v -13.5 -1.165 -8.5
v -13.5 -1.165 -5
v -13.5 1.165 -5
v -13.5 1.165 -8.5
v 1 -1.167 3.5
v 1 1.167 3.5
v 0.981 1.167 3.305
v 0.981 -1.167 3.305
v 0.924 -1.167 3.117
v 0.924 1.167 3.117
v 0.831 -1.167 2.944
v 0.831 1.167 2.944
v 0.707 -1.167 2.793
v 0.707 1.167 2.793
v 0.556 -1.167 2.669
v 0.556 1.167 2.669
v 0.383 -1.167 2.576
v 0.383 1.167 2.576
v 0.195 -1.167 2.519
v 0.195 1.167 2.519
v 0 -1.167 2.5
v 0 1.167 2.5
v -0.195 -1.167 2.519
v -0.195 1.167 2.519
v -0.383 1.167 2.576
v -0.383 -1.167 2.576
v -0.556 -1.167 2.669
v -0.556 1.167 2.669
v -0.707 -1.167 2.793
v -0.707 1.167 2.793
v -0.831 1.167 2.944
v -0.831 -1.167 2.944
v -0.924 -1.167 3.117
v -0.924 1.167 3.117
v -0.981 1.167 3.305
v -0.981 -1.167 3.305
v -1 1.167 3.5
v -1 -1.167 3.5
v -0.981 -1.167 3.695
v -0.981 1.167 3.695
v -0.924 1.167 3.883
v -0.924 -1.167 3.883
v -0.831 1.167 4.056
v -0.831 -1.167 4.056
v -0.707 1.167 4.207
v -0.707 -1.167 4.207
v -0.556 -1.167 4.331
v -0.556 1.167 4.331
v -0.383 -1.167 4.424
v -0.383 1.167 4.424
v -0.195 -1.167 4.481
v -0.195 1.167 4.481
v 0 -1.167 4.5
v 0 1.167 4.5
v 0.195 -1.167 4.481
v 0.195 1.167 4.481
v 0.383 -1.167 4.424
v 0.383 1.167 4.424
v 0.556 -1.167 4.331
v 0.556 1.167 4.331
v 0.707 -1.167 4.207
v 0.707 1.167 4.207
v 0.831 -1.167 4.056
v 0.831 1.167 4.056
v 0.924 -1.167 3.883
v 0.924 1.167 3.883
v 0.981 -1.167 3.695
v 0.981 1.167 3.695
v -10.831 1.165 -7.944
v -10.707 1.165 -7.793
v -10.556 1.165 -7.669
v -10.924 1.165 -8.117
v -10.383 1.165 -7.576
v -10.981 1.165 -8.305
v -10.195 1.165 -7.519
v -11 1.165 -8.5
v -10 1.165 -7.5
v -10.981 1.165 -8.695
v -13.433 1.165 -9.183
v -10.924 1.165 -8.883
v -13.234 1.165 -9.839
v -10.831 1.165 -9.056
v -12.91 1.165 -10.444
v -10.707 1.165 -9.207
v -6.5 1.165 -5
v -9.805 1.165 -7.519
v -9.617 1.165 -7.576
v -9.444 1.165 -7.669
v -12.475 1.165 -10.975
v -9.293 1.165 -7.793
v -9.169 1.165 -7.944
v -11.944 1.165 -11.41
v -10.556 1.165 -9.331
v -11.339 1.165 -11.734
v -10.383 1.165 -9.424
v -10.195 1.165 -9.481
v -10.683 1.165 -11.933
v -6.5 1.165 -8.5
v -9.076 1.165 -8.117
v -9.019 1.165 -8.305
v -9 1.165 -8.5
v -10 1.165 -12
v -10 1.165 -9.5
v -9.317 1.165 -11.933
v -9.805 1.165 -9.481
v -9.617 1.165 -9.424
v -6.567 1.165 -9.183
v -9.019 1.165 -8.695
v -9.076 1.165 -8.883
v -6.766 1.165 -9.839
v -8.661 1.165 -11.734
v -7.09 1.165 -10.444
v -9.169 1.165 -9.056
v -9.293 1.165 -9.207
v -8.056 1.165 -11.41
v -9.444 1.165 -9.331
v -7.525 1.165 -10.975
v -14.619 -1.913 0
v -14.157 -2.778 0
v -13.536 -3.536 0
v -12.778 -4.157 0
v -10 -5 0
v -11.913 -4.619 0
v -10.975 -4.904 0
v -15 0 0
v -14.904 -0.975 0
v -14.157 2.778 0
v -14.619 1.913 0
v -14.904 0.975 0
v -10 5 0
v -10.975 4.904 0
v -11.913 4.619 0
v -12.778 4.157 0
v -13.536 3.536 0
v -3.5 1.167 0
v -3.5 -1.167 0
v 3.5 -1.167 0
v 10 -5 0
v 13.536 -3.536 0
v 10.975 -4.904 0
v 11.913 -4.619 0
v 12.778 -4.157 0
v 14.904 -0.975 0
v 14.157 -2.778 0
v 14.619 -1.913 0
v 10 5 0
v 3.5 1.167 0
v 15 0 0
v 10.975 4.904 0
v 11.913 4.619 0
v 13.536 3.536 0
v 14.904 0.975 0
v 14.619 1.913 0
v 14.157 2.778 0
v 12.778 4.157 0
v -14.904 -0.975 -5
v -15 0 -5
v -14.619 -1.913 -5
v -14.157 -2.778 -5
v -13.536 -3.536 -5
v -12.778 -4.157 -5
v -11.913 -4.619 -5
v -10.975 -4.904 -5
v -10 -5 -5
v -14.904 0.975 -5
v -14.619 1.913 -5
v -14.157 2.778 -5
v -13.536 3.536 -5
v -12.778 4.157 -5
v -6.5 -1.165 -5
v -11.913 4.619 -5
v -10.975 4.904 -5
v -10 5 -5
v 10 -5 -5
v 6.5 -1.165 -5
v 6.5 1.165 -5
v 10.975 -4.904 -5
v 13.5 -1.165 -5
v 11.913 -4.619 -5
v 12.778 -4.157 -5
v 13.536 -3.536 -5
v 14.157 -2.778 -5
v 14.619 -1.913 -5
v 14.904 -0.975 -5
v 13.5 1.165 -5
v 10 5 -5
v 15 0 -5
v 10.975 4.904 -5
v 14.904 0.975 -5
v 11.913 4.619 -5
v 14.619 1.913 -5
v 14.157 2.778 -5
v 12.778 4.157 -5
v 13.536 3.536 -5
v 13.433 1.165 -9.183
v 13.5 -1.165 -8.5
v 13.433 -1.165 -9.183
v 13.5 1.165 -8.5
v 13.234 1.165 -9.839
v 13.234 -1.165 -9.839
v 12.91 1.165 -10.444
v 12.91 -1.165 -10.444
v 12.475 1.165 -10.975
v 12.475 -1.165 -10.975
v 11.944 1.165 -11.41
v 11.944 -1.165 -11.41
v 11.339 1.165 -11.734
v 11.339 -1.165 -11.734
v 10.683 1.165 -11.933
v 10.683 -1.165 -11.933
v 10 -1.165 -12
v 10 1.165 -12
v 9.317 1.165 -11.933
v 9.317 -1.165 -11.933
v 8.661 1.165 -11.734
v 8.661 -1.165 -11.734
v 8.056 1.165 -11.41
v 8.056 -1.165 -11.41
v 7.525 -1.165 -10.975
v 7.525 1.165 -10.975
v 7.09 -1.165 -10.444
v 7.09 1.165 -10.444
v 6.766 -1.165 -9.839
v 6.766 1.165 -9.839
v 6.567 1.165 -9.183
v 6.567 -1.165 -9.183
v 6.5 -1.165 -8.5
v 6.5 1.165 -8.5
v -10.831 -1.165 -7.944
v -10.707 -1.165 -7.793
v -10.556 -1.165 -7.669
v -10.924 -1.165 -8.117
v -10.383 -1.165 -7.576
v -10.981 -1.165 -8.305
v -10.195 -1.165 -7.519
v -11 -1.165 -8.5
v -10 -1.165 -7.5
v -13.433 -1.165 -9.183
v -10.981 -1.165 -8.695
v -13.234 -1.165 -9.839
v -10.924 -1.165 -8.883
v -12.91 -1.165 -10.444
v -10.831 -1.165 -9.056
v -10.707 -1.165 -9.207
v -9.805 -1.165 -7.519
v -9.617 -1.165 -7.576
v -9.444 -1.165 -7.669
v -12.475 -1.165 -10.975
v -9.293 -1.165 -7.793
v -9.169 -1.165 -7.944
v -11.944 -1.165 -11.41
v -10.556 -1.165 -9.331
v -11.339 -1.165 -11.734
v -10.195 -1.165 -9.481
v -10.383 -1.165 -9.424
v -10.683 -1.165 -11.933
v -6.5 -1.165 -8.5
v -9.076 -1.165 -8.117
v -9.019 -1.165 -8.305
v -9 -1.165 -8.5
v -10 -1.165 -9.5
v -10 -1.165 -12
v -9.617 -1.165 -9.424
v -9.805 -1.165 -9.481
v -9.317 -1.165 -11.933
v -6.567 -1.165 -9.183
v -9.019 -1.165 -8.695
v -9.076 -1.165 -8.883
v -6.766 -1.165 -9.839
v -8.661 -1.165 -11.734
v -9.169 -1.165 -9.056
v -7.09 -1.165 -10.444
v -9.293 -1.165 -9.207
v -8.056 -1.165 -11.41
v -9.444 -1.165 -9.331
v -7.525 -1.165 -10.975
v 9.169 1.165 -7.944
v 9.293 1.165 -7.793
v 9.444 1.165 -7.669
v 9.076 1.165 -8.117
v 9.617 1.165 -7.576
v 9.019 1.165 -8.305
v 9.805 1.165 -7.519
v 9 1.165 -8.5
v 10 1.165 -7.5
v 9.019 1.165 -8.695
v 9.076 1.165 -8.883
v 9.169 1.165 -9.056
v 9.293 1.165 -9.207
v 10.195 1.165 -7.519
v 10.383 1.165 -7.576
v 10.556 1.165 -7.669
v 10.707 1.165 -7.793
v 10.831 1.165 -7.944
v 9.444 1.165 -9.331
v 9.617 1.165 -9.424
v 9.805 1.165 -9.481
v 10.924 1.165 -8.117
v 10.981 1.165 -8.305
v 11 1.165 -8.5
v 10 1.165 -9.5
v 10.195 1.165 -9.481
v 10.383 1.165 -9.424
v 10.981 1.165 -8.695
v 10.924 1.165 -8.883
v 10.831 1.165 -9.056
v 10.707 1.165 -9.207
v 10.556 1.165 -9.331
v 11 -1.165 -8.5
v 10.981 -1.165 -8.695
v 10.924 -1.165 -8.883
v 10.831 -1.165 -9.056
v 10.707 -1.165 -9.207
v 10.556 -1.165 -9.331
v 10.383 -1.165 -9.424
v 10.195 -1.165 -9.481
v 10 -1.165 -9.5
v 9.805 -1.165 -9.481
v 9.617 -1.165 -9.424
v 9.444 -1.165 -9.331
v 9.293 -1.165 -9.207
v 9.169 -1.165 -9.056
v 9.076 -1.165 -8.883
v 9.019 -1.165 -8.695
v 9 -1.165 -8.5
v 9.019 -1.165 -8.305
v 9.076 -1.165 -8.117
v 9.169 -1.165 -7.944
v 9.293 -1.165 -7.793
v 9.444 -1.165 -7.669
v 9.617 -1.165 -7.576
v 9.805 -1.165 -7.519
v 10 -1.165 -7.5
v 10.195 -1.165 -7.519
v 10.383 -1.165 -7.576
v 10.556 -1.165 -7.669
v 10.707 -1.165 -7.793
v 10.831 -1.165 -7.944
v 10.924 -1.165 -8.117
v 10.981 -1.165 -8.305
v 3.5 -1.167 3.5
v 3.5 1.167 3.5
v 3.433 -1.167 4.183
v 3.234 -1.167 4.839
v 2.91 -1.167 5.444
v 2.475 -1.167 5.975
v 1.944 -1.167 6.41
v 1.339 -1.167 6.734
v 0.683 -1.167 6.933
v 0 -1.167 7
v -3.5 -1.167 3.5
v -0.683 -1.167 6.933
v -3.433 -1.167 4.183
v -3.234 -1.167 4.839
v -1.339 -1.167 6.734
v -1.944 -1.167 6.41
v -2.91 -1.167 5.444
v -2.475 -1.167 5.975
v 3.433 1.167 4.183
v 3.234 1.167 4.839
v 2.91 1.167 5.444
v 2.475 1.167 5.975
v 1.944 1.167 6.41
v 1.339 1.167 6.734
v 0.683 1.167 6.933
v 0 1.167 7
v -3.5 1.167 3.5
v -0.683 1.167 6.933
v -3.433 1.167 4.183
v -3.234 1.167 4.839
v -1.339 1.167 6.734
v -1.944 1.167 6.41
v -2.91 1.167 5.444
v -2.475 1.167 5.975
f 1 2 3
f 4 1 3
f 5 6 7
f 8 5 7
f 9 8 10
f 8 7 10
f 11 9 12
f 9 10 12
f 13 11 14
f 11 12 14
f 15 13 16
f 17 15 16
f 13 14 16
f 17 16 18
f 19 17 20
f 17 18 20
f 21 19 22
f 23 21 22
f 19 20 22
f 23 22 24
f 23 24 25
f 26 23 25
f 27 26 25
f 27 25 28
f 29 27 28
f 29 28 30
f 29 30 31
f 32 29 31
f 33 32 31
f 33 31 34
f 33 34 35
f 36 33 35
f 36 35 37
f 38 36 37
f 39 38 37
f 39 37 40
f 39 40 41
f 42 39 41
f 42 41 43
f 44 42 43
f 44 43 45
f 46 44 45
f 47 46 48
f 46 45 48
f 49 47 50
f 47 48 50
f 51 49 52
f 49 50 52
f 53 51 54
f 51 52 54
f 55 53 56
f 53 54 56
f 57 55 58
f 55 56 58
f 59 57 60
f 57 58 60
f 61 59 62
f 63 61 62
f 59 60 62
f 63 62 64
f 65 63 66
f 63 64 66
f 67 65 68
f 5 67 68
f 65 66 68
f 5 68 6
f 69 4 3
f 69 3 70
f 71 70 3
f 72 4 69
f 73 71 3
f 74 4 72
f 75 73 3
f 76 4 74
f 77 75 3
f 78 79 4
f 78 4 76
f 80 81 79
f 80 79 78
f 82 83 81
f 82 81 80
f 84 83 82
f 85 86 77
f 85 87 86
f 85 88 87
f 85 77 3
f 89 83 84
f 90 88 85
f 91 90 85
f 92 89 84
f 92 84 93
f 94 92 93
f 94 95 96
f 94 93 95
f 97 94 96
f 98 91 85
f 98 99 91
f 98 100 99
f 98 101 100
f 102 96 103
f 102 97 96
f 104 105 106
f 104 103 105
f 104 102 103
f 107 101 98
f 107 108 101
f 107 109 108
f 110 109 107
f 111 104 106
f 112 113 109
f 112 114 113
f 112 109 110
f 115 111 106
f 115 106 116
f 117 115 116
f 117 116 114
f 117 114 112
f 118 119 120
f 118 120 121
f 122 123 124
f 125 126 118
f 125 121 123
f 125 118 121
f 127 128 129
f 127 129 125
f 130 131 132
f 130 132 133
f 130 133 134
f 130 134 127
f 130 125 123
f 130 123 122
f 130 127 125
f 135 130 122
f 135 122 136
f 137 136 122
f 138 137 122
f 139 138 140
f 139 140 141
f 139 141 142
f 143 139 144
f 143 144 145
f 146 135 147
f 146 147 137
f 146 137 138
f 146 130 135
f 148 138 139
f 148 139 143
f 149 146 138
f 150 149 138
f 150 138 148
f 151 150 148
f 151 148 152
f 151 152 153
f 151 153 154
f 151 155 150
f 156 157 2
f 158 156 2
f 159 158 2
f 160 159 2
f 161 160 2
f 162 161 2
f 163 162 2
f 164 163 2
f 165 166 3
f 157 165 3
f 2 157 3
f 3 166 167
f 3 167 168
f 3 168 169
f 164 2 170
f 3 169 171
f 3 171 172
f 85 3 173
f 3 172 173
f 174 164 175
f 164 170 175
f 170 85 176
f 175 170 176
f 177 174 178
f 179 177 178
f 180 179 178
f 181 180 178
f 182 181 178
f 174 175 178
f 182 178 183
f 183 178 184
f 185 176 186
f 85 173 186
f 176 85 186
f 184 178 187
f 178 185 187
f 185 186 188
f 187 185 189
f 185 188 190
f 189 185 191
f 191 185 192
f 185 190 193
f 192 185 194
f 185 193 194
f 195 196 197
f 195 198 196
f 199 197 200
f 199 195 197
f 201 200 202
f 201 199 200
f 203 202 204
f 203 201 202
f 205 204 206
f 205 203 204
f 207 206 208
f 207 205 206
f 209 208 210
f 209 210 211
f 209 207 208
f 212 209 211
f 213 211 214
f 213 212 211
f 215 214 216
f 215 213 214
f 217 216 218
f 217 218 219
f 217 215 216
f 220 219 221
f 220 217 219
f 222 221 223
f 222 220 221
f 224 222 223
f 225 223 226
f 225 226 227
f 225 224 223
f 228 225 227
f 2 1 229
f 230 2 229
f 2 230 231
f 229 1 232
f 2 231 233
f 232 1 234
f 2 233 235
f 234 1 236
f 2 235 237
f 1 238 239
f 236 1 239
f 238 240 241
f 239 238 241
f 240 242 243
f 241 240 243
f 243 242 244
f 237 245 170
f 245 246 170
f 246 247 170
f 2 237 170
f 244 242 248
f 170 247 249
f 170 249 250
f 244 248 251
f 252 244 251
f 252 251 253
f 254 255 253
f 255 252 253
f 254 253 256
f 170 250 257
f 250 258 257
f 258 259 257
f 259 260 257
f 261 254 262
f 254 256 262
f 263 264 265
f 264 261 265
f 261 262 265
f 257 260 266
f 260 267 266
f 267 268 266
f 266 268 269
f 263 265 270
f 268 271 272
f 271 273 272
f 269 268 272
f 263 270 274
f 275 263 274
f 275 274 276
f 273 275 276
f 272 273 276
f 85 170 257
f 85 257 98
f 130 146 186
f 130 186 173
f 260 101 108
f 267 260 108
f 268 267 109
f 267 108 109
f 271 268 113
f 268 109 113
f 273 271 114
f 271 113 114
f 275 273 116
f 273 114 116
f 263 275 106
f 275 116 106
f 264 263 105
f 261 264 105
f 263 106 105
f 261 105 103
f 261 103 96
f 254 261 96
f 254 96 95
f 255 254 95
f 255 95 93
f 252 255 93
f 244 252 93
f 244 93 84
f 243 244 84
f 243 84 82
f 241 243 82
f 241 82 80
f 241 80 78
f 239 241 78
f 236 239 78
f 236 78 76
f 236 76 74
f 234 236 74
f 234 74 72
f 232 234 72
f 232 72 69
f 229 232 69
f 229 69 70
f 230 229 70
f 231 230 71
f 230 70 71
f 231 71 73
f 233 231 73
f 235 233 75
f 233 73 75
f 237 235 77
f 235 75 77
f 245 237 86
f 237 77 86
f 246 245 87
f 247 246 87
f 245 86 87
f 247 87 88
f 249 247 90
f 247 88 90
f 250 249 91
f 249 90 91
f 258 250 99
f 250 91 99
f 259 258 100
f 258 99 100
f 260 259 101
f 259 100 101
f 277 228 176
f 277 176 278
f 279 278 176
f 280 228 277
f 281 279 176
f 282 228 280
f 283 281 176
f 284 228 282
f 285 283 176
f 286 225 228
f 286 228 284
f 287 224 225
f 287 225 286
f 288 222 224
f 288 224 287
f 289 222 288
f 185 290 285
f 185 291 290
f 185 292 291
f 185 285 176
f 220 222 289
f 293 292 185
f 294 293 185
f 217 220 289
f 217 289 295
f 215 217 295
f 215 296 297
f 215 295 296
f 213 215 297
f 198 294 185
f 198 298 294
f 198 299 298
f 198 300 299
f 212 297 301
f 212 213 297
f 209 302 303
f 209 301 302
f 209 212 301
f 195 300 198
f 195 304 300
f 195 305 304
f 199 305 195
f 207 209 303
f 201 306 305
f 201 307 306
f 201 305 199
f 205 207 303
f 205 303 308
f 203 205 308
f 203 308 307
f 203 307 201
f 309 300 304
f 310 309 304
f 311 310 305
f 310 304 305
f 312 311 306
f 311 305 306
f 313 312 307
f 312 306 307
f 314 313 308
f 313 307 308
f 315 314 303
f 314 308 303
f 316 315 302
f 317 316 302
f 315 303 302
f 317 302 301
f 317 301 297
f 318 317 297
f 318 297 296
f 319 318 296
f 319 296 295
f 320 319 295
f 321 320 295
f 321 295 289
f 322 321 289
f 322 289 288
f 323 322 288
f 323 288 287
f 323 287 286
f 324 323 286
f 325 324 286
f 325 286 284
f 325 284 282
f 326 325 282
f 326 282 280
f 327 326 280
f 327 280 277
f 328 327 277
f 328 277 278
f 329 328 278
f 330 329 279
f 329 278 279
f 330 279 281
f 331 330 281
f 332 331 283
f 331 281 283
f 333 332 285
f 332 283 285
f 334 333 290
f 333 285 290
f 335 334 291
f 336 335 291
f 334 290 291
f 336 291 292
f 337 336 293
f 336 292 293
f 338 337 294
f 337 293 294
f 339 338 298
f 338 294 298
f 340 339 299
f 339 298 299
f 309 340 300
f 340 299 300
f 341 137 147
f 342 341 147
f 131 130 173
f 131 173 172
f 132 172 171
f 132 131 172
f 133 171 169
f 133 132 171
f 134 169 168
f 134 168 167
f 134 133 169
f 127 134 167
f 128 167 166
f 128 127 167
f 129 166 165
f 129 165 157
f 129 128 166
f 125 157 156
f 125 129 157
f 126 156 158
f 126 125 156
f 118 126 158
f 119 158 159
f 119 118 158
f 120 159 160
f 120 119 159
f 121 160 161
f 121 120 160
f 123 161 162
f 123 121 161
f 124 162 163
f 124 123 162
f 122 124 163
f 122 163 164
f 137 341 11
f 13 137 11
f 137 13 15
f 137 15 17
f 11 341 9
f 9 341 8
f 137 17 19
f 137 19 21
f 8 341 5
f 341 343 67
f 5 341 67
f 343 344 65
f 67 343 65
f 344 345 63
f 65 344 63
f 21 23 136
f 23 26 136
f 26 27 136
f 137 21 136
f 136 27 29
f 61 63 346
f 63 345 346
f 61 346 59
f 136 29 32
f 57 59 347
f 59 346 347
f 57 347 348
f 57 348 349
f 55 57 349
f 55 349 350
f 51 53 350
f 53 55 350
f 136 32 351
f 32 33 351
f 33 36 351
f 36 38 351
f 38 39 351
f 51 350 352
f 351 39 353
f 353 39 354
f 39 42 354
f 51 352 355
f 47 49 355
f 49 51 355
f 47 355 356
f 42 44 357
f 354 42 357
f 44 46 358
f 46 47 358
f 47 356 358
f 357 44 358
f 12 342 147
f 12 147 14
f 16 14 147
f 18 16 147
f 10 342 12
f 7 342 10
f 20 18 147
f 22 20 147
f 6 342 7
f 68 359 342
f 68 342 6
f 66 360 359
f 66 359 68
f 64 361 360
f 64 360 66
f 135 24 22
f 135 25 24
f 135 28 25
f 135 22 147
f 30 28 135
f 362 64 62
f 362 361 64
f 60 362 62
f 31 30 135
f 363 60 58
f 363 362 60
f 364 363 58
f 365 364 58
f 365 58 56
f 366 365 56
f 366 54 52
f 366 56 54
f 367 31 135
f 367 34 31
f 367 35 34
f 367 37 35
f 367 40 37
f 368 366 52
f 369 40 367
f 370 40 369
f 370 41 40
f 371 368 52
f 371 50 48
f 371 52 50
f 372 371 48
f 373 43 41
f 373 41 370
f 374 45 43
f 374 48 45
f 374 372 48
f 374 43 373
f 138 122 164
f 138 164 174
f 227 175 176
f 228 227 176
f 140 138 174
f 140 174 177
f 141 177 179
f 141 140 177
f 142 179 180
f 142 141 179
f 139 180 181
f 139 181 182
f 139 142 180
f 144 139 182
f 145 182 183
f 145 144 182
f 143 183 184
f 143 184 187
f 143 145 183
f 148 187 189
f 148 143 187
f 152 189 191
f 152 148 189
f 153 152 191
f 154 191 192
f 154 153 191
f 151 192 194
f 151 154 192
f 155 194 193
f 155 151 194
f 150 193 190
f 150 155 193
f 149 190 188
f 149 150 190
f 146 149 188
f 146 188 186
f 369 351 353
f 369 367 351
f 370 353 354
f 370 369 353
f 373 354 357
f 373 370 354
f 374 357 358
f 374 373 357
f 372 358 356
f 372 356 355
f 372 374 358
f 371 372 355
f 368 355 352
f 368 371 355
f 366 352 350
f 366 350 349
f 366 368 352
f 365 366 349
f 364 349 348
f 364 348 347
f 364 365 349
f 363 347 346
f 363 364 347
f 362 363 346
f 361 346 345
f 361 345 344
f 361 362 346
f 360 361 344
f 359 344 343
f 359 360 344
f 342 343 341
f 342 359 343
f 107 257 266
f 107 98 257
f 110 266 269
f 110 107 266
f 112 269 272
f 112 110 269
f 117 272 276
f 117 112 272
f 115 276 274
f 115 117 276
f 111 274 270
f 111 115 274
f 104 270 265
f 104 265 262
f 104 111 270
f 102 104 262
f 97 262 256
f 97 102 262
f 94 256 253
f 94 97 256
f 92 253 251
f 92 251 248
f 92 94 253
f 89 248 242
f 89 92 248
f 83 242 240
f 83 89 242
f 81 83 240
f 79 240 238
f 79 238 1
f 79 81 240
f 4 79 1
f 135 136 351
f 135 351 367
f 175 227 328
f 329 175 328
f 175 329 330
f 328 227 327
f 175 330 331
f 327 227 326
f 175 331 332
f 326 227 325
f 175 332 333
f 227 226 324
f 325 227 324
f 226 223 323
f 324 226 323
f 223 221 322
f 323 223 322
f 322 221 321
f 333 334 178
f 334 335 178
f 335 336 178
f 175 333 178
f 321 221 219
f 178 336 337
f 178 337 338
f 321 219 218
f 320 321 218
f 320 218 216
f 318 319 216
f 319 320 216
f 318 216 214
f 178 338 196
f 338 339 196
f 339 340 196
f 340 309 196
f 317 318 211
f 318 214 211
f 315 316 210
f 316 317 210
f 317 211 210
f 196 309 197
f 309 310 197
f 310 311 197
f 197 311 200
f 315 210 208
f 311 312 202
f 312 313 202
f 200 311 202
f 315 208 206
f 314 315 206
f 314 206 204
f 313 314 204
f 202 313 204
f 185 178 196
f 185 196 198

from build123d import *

# Parameters (mm, degrees)
BOSS_EXTRUDE1_DEPTH = 5
SKETCH3_W           = 7
SKETCH3_H           = 2.333333334
BOSS_EXTRUDE2_DEPTH = 3.5
SKETCH6_W           = 3.5
SKETCH6_H           = 2.333333334
REVOLVE1_ANGLE      = 180
CUT_EXTRUDE1_REACH  = 19.664
SKETCH7_R           = 1
SKETCH8_W           = 7
SKETCH8_H           = 2.33
BOSS_EXTRUDE3_DEPTH = 3.5
SKETCH9_W           = 3.5
SKETCH9_H           = 2.33
REVOLVE2_ANGLE      = 180
SKETCH9_3_W         = 3.5
SKETCH9_3_H         = 2.33
REVOLVE3_ANGLE      = 180
CUT_EXTRUDE2_REACH  = 22.174
SKETCH11_R          = 1


with BuildPart() as part:
    # Sketch2 → Boss-Extrude1 (new body)
    with BuildSketch(Plane.XY):
        with BuildLine():
            Line((-10, -5), (10, -5))
            ThreePointArc((10, -5), (15, 0), (10, 5))
            Line((10, 5), (-10, 5))
            ThreePointArc((-10, 5), (-15, 0), (-10, -5))
        make_face()
    extrude(amount=-BOSS_EXTRUDE1_DEPTH)

    # Sketch3 → Boss-Extrude2 (add)
    with BuildSketch(Plane.XY):
        Rectangle(SKETCH3_W, SKETCH3_H)
    extrude(amount=BOSS_EXTRUDE2_DEPTH)

    # Sketch6 → Revolve1 (revolve)
    with BuildSketch(Plane.XY.offset(3.5)):
        with Locations((-1.75, 0)):
            Rectangle(SKETCH6_W, SKETCH6_H)
    revolve(axis=Axis((0, 1.166666667, 3.5), (0, 1, 0)), revolution_arc=REVOLVE1_ANGLE)

    # Sketch7 → Cut-Extrude1 (cut, up to next)
    with BuildSketch(Plane(origin=(0, 1.166666667, 0), x_dir=(1, 0, 0), z_dir=(0, 1, 0)), mode=Mode.PRIVATE) as cut_extrude1_sk1:
        with Locations((0, -3.5)):
            Circle(SKETCH7_R)
    cut_extrude1_tool1 = extrude(cut_extrude1_sk1.sketch, amount=-CUT_EXTRUDE1_REACH, mode=Mode.PRIVATE) & part.part
    add(cut_extrude1_tool1.solids().sort_by_distance((0, 1.166667, 3.5))[0], mode=Mode.SUBTRACT)

    # Sketch8 → Boss-Extrude3 (add)
    with BuildSketch(Plane(origin=(0, 0, -5), x_dir=(-1, 0, 0), z_dir=(0, 0, -1))):
        with Locations((-10, 0)):
            Rectangle(SKETCH8_W, SKETCH8_H)
        with Locations((10, 0)):
            Rectangle(SKETCH8_W, SKETCH8_H)
    extrude(amount=BOSS_EXTRUDE3_DEPTH)

    # Sketch9 → Revolve2 (revolve)
    with BuildSketch(Plane(origin=(0, 0, -8.5), x_dir=(-1, 0, 0), z_dir=(0, 0, -1))):
        with Locations((-11.75, 0)):
            Rectangle(SKETCH9_W, SKETCH9_H)
    revolve(axis=Axis((10, 1.165, -8.5), (0, 1, 0)), revolution_arc=REVOLVE2_ANGLE)

    # Sketch9<3> → Revolve3 (revolve)
    with BuildSketch(Plane(origin=(0, 0, -8.5), x_dir=(-1, 0, 0), z_dir=(0, 0, -1))):
        with Locations((8.25, 0)):
            Rectangle(SKETCH9_3_W, SKETCH9_3_H)
    revolve(axis=Axis((-10, 1.165, -8.5), (0, 1, 0)), revolution_arc=REVOLVE3_ANGLE)

    # Sketch11 → Cut-Extrude2 (cut, up to next)
    with BuildSketch(Plane(origin=(0, 1.165, 0), x_dir=(1, 0, 0), z_dir=(0, 1, 0)), mode=Mode.PRIVATE) as cut_extrude2_sk1:
        with Locations((-10, 8.5)):
            Circle(SKETCH11_R)
    cut_extrude2_tool1 = extrude(cut_extrude2_sk1.sketch, amount=-CUT_EXTRUDE2_REACH, mode=Mode.PRIVATE) & part.part
    # Sketch11 → Cut-Extrude2 (cut, up to next)
    with BuildSketch(Plane(origin=(0, 1.165, 0), x_dir=(1, 0, 0), z_dir=(0, 1, 0)), mode=Mode.PRIVATE) as cut_extrude2_sk2:
        with Locations((10, 8.5)):
            Circle(SKETCH11_R)
    cut_extrude2_tool2 = extrude(cut_extrude2_sk2.sketch, amount=-CUT_EXTRUDE2_REACH, mode=Mode.PRIVATE) & part.part
    add(cut_extrude2_tool1.solids().sort_by_distance((-10, 1.165, -8.5))[0], mode=Mode.SUBTRACT)
    add(cut_extrude2_tool2.solids().sort_by_distance((10, 1.165, -8.5))[0], mode=Mode.SUBTRACT)


solid = part.part
